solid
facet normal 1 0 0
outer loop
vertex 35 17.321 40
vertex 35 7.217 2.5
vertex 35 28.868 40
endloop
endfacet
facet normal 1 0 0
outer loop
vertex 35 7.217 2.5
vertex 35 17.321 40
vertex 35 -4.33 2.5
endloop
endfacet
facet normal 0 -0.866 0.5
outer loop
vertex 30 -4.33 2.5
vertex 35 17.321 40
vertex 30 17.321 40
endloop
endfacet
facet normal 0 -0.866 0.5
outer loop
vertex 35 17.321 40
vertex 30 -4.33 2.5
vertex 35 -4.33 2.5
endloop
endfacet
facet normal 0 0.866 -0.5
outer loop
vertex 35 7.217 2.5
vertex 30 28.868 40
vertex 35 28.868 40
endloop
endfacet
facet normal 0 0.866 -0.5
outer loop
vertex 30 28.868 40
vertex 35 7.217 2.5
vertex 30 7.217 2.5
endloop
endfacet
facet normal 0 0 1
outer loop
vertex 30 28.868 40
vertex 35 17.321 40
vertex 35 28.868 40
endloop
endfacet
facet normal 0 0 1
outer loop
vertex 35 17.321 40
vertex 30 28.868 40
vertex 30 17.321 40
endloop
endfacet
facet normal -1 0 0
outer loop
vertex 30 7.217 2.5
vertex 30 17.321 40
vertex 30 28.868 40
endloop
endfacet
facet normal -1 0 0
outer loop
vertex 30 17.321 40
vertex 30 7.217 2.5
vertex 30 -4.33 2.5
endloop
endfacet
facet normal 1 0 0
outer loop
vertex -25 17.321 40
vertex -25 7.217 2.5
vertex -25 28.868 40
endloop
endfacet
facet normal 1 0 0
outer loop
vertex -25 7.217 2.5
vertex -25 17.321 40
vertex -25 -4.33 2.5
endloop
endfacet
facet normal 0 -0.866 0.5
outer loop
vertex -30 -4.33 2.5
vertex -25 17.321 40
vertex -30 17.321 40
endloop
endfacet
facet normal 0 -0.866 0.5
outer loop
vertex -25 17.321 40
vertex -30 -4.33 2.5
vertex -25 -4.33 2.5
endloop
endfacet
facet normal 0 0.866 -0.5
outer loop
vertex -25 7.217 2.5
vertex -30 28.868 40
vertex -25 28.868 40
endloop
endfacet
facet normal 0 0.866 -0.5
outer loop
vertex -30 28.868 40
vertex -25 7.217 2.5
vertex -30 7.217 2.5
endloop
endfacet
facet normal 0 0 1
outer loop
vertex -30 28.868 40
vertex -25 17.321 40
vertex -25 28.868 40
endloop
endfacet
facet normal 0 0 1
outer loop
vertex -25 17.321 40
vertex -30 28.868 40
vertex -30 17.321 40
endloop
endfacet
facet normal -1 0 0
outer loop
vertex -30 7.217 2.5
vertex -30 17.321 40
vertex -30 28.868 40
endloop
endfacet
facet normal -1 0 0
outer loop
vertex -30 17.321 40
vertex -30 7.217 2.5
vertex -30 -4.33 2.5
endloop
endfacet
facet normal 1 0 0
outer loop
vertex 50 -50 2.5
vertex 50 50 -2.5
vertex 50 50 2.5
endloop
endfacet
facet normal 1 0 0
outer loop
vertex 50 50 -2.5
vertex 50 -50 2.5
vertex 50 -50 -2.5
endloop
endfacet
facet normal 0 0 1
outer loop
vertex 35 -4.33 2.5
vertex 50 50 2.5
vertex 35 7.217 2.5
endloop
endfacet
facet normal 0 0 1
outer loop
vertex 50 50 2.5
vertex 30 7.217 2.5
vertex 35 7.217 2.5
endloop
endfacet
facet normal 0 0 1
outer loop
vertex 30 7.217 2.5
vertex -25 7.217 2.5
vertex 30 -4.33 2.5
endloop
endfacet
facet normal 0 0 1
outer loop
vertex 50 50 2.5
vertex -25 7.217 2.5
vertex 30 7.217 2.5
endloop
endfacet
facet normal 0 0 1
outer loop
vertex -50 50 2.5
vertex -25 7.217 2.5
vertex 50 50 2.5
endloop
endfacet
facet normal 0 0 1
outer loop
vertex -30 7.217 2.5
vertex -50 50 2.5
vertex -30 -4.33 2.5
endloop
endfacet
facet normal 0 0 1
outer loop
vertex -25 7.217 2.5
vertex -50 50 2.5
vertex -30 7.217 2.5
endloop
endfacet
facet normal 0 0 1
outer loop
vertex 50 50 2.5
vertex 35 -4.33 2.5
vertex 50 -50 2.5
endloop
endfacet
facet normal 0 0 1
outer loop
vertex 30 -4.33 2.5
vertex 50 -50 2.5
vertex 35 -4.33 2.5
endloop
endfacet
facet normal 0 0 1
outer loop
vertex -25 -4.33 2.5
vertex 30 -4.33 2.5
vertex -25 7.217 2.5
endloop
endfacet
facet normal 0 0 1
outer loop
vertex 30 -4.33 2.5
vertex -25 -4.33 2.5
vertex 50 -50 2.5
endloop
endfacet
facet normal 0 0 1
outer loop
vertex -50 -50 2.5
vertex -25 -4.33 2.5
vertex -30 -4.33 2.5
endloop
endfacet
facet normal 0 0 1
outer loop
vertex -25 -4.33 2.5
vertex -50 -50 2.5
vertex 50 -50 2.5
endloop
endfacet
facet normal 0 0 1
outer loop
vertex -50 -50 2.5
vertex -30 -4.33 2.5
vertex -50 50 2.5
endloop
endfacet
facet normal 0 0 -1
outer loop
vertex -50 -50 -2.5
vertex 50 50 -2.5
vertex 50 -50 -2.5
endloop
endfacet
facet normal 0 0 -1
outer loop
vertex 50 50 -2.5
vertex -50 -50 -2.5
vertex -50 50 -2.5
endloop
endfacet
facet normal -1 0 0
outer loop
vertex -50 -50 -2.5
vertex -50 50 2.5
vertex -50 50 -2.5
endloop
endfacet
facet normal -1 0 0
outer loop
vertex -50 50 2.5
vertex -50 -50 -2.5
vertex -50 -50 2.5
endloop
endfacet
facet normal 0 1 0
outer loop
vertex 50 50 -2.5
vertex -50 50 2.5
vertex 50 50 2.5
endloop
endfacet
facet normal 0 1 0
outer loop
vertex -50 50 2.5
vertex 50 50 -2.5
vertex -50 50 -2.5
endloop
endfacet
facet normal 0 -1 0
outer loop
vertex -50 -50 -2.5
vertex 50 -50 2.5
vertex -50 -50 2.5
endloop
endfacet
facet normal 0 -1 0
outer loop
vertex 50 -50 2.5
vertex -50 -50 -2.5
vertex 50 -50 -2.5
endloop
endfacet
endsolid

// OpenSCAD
$fn=100;

mount_w = 100;
mount_h = 100;
mount_d = 5;

stick_distance = 30;

bucket_height   = 235;
bucket_d_top    = 268;
bucket_d_bottom = 195;

cube([mount_w, mount_h, mount_d], center=true);

difference() {
    sticks();
    bucket();
}

module sticks() {
    translate([ stick_distance, 0, 0]) stick();
    translate([-stick_distance, 0, 0]) stick();
}

module stick() {
    intersection() {
        rotate([ 60, 0, 0])
            cube([10,100,10], center=true);
        translate([50, 0, 20])
            cube([mount_w, mount_h, 40], center=true);
    }
}

module bucket() {
    translate([0, -110, 170])
    rotate([-90,0,0])
        cylinder(
            h = bucket_height,
            d1 = bucket_d_bottom,
            d2 = bucket_d_top,
            center = true
         );
}
